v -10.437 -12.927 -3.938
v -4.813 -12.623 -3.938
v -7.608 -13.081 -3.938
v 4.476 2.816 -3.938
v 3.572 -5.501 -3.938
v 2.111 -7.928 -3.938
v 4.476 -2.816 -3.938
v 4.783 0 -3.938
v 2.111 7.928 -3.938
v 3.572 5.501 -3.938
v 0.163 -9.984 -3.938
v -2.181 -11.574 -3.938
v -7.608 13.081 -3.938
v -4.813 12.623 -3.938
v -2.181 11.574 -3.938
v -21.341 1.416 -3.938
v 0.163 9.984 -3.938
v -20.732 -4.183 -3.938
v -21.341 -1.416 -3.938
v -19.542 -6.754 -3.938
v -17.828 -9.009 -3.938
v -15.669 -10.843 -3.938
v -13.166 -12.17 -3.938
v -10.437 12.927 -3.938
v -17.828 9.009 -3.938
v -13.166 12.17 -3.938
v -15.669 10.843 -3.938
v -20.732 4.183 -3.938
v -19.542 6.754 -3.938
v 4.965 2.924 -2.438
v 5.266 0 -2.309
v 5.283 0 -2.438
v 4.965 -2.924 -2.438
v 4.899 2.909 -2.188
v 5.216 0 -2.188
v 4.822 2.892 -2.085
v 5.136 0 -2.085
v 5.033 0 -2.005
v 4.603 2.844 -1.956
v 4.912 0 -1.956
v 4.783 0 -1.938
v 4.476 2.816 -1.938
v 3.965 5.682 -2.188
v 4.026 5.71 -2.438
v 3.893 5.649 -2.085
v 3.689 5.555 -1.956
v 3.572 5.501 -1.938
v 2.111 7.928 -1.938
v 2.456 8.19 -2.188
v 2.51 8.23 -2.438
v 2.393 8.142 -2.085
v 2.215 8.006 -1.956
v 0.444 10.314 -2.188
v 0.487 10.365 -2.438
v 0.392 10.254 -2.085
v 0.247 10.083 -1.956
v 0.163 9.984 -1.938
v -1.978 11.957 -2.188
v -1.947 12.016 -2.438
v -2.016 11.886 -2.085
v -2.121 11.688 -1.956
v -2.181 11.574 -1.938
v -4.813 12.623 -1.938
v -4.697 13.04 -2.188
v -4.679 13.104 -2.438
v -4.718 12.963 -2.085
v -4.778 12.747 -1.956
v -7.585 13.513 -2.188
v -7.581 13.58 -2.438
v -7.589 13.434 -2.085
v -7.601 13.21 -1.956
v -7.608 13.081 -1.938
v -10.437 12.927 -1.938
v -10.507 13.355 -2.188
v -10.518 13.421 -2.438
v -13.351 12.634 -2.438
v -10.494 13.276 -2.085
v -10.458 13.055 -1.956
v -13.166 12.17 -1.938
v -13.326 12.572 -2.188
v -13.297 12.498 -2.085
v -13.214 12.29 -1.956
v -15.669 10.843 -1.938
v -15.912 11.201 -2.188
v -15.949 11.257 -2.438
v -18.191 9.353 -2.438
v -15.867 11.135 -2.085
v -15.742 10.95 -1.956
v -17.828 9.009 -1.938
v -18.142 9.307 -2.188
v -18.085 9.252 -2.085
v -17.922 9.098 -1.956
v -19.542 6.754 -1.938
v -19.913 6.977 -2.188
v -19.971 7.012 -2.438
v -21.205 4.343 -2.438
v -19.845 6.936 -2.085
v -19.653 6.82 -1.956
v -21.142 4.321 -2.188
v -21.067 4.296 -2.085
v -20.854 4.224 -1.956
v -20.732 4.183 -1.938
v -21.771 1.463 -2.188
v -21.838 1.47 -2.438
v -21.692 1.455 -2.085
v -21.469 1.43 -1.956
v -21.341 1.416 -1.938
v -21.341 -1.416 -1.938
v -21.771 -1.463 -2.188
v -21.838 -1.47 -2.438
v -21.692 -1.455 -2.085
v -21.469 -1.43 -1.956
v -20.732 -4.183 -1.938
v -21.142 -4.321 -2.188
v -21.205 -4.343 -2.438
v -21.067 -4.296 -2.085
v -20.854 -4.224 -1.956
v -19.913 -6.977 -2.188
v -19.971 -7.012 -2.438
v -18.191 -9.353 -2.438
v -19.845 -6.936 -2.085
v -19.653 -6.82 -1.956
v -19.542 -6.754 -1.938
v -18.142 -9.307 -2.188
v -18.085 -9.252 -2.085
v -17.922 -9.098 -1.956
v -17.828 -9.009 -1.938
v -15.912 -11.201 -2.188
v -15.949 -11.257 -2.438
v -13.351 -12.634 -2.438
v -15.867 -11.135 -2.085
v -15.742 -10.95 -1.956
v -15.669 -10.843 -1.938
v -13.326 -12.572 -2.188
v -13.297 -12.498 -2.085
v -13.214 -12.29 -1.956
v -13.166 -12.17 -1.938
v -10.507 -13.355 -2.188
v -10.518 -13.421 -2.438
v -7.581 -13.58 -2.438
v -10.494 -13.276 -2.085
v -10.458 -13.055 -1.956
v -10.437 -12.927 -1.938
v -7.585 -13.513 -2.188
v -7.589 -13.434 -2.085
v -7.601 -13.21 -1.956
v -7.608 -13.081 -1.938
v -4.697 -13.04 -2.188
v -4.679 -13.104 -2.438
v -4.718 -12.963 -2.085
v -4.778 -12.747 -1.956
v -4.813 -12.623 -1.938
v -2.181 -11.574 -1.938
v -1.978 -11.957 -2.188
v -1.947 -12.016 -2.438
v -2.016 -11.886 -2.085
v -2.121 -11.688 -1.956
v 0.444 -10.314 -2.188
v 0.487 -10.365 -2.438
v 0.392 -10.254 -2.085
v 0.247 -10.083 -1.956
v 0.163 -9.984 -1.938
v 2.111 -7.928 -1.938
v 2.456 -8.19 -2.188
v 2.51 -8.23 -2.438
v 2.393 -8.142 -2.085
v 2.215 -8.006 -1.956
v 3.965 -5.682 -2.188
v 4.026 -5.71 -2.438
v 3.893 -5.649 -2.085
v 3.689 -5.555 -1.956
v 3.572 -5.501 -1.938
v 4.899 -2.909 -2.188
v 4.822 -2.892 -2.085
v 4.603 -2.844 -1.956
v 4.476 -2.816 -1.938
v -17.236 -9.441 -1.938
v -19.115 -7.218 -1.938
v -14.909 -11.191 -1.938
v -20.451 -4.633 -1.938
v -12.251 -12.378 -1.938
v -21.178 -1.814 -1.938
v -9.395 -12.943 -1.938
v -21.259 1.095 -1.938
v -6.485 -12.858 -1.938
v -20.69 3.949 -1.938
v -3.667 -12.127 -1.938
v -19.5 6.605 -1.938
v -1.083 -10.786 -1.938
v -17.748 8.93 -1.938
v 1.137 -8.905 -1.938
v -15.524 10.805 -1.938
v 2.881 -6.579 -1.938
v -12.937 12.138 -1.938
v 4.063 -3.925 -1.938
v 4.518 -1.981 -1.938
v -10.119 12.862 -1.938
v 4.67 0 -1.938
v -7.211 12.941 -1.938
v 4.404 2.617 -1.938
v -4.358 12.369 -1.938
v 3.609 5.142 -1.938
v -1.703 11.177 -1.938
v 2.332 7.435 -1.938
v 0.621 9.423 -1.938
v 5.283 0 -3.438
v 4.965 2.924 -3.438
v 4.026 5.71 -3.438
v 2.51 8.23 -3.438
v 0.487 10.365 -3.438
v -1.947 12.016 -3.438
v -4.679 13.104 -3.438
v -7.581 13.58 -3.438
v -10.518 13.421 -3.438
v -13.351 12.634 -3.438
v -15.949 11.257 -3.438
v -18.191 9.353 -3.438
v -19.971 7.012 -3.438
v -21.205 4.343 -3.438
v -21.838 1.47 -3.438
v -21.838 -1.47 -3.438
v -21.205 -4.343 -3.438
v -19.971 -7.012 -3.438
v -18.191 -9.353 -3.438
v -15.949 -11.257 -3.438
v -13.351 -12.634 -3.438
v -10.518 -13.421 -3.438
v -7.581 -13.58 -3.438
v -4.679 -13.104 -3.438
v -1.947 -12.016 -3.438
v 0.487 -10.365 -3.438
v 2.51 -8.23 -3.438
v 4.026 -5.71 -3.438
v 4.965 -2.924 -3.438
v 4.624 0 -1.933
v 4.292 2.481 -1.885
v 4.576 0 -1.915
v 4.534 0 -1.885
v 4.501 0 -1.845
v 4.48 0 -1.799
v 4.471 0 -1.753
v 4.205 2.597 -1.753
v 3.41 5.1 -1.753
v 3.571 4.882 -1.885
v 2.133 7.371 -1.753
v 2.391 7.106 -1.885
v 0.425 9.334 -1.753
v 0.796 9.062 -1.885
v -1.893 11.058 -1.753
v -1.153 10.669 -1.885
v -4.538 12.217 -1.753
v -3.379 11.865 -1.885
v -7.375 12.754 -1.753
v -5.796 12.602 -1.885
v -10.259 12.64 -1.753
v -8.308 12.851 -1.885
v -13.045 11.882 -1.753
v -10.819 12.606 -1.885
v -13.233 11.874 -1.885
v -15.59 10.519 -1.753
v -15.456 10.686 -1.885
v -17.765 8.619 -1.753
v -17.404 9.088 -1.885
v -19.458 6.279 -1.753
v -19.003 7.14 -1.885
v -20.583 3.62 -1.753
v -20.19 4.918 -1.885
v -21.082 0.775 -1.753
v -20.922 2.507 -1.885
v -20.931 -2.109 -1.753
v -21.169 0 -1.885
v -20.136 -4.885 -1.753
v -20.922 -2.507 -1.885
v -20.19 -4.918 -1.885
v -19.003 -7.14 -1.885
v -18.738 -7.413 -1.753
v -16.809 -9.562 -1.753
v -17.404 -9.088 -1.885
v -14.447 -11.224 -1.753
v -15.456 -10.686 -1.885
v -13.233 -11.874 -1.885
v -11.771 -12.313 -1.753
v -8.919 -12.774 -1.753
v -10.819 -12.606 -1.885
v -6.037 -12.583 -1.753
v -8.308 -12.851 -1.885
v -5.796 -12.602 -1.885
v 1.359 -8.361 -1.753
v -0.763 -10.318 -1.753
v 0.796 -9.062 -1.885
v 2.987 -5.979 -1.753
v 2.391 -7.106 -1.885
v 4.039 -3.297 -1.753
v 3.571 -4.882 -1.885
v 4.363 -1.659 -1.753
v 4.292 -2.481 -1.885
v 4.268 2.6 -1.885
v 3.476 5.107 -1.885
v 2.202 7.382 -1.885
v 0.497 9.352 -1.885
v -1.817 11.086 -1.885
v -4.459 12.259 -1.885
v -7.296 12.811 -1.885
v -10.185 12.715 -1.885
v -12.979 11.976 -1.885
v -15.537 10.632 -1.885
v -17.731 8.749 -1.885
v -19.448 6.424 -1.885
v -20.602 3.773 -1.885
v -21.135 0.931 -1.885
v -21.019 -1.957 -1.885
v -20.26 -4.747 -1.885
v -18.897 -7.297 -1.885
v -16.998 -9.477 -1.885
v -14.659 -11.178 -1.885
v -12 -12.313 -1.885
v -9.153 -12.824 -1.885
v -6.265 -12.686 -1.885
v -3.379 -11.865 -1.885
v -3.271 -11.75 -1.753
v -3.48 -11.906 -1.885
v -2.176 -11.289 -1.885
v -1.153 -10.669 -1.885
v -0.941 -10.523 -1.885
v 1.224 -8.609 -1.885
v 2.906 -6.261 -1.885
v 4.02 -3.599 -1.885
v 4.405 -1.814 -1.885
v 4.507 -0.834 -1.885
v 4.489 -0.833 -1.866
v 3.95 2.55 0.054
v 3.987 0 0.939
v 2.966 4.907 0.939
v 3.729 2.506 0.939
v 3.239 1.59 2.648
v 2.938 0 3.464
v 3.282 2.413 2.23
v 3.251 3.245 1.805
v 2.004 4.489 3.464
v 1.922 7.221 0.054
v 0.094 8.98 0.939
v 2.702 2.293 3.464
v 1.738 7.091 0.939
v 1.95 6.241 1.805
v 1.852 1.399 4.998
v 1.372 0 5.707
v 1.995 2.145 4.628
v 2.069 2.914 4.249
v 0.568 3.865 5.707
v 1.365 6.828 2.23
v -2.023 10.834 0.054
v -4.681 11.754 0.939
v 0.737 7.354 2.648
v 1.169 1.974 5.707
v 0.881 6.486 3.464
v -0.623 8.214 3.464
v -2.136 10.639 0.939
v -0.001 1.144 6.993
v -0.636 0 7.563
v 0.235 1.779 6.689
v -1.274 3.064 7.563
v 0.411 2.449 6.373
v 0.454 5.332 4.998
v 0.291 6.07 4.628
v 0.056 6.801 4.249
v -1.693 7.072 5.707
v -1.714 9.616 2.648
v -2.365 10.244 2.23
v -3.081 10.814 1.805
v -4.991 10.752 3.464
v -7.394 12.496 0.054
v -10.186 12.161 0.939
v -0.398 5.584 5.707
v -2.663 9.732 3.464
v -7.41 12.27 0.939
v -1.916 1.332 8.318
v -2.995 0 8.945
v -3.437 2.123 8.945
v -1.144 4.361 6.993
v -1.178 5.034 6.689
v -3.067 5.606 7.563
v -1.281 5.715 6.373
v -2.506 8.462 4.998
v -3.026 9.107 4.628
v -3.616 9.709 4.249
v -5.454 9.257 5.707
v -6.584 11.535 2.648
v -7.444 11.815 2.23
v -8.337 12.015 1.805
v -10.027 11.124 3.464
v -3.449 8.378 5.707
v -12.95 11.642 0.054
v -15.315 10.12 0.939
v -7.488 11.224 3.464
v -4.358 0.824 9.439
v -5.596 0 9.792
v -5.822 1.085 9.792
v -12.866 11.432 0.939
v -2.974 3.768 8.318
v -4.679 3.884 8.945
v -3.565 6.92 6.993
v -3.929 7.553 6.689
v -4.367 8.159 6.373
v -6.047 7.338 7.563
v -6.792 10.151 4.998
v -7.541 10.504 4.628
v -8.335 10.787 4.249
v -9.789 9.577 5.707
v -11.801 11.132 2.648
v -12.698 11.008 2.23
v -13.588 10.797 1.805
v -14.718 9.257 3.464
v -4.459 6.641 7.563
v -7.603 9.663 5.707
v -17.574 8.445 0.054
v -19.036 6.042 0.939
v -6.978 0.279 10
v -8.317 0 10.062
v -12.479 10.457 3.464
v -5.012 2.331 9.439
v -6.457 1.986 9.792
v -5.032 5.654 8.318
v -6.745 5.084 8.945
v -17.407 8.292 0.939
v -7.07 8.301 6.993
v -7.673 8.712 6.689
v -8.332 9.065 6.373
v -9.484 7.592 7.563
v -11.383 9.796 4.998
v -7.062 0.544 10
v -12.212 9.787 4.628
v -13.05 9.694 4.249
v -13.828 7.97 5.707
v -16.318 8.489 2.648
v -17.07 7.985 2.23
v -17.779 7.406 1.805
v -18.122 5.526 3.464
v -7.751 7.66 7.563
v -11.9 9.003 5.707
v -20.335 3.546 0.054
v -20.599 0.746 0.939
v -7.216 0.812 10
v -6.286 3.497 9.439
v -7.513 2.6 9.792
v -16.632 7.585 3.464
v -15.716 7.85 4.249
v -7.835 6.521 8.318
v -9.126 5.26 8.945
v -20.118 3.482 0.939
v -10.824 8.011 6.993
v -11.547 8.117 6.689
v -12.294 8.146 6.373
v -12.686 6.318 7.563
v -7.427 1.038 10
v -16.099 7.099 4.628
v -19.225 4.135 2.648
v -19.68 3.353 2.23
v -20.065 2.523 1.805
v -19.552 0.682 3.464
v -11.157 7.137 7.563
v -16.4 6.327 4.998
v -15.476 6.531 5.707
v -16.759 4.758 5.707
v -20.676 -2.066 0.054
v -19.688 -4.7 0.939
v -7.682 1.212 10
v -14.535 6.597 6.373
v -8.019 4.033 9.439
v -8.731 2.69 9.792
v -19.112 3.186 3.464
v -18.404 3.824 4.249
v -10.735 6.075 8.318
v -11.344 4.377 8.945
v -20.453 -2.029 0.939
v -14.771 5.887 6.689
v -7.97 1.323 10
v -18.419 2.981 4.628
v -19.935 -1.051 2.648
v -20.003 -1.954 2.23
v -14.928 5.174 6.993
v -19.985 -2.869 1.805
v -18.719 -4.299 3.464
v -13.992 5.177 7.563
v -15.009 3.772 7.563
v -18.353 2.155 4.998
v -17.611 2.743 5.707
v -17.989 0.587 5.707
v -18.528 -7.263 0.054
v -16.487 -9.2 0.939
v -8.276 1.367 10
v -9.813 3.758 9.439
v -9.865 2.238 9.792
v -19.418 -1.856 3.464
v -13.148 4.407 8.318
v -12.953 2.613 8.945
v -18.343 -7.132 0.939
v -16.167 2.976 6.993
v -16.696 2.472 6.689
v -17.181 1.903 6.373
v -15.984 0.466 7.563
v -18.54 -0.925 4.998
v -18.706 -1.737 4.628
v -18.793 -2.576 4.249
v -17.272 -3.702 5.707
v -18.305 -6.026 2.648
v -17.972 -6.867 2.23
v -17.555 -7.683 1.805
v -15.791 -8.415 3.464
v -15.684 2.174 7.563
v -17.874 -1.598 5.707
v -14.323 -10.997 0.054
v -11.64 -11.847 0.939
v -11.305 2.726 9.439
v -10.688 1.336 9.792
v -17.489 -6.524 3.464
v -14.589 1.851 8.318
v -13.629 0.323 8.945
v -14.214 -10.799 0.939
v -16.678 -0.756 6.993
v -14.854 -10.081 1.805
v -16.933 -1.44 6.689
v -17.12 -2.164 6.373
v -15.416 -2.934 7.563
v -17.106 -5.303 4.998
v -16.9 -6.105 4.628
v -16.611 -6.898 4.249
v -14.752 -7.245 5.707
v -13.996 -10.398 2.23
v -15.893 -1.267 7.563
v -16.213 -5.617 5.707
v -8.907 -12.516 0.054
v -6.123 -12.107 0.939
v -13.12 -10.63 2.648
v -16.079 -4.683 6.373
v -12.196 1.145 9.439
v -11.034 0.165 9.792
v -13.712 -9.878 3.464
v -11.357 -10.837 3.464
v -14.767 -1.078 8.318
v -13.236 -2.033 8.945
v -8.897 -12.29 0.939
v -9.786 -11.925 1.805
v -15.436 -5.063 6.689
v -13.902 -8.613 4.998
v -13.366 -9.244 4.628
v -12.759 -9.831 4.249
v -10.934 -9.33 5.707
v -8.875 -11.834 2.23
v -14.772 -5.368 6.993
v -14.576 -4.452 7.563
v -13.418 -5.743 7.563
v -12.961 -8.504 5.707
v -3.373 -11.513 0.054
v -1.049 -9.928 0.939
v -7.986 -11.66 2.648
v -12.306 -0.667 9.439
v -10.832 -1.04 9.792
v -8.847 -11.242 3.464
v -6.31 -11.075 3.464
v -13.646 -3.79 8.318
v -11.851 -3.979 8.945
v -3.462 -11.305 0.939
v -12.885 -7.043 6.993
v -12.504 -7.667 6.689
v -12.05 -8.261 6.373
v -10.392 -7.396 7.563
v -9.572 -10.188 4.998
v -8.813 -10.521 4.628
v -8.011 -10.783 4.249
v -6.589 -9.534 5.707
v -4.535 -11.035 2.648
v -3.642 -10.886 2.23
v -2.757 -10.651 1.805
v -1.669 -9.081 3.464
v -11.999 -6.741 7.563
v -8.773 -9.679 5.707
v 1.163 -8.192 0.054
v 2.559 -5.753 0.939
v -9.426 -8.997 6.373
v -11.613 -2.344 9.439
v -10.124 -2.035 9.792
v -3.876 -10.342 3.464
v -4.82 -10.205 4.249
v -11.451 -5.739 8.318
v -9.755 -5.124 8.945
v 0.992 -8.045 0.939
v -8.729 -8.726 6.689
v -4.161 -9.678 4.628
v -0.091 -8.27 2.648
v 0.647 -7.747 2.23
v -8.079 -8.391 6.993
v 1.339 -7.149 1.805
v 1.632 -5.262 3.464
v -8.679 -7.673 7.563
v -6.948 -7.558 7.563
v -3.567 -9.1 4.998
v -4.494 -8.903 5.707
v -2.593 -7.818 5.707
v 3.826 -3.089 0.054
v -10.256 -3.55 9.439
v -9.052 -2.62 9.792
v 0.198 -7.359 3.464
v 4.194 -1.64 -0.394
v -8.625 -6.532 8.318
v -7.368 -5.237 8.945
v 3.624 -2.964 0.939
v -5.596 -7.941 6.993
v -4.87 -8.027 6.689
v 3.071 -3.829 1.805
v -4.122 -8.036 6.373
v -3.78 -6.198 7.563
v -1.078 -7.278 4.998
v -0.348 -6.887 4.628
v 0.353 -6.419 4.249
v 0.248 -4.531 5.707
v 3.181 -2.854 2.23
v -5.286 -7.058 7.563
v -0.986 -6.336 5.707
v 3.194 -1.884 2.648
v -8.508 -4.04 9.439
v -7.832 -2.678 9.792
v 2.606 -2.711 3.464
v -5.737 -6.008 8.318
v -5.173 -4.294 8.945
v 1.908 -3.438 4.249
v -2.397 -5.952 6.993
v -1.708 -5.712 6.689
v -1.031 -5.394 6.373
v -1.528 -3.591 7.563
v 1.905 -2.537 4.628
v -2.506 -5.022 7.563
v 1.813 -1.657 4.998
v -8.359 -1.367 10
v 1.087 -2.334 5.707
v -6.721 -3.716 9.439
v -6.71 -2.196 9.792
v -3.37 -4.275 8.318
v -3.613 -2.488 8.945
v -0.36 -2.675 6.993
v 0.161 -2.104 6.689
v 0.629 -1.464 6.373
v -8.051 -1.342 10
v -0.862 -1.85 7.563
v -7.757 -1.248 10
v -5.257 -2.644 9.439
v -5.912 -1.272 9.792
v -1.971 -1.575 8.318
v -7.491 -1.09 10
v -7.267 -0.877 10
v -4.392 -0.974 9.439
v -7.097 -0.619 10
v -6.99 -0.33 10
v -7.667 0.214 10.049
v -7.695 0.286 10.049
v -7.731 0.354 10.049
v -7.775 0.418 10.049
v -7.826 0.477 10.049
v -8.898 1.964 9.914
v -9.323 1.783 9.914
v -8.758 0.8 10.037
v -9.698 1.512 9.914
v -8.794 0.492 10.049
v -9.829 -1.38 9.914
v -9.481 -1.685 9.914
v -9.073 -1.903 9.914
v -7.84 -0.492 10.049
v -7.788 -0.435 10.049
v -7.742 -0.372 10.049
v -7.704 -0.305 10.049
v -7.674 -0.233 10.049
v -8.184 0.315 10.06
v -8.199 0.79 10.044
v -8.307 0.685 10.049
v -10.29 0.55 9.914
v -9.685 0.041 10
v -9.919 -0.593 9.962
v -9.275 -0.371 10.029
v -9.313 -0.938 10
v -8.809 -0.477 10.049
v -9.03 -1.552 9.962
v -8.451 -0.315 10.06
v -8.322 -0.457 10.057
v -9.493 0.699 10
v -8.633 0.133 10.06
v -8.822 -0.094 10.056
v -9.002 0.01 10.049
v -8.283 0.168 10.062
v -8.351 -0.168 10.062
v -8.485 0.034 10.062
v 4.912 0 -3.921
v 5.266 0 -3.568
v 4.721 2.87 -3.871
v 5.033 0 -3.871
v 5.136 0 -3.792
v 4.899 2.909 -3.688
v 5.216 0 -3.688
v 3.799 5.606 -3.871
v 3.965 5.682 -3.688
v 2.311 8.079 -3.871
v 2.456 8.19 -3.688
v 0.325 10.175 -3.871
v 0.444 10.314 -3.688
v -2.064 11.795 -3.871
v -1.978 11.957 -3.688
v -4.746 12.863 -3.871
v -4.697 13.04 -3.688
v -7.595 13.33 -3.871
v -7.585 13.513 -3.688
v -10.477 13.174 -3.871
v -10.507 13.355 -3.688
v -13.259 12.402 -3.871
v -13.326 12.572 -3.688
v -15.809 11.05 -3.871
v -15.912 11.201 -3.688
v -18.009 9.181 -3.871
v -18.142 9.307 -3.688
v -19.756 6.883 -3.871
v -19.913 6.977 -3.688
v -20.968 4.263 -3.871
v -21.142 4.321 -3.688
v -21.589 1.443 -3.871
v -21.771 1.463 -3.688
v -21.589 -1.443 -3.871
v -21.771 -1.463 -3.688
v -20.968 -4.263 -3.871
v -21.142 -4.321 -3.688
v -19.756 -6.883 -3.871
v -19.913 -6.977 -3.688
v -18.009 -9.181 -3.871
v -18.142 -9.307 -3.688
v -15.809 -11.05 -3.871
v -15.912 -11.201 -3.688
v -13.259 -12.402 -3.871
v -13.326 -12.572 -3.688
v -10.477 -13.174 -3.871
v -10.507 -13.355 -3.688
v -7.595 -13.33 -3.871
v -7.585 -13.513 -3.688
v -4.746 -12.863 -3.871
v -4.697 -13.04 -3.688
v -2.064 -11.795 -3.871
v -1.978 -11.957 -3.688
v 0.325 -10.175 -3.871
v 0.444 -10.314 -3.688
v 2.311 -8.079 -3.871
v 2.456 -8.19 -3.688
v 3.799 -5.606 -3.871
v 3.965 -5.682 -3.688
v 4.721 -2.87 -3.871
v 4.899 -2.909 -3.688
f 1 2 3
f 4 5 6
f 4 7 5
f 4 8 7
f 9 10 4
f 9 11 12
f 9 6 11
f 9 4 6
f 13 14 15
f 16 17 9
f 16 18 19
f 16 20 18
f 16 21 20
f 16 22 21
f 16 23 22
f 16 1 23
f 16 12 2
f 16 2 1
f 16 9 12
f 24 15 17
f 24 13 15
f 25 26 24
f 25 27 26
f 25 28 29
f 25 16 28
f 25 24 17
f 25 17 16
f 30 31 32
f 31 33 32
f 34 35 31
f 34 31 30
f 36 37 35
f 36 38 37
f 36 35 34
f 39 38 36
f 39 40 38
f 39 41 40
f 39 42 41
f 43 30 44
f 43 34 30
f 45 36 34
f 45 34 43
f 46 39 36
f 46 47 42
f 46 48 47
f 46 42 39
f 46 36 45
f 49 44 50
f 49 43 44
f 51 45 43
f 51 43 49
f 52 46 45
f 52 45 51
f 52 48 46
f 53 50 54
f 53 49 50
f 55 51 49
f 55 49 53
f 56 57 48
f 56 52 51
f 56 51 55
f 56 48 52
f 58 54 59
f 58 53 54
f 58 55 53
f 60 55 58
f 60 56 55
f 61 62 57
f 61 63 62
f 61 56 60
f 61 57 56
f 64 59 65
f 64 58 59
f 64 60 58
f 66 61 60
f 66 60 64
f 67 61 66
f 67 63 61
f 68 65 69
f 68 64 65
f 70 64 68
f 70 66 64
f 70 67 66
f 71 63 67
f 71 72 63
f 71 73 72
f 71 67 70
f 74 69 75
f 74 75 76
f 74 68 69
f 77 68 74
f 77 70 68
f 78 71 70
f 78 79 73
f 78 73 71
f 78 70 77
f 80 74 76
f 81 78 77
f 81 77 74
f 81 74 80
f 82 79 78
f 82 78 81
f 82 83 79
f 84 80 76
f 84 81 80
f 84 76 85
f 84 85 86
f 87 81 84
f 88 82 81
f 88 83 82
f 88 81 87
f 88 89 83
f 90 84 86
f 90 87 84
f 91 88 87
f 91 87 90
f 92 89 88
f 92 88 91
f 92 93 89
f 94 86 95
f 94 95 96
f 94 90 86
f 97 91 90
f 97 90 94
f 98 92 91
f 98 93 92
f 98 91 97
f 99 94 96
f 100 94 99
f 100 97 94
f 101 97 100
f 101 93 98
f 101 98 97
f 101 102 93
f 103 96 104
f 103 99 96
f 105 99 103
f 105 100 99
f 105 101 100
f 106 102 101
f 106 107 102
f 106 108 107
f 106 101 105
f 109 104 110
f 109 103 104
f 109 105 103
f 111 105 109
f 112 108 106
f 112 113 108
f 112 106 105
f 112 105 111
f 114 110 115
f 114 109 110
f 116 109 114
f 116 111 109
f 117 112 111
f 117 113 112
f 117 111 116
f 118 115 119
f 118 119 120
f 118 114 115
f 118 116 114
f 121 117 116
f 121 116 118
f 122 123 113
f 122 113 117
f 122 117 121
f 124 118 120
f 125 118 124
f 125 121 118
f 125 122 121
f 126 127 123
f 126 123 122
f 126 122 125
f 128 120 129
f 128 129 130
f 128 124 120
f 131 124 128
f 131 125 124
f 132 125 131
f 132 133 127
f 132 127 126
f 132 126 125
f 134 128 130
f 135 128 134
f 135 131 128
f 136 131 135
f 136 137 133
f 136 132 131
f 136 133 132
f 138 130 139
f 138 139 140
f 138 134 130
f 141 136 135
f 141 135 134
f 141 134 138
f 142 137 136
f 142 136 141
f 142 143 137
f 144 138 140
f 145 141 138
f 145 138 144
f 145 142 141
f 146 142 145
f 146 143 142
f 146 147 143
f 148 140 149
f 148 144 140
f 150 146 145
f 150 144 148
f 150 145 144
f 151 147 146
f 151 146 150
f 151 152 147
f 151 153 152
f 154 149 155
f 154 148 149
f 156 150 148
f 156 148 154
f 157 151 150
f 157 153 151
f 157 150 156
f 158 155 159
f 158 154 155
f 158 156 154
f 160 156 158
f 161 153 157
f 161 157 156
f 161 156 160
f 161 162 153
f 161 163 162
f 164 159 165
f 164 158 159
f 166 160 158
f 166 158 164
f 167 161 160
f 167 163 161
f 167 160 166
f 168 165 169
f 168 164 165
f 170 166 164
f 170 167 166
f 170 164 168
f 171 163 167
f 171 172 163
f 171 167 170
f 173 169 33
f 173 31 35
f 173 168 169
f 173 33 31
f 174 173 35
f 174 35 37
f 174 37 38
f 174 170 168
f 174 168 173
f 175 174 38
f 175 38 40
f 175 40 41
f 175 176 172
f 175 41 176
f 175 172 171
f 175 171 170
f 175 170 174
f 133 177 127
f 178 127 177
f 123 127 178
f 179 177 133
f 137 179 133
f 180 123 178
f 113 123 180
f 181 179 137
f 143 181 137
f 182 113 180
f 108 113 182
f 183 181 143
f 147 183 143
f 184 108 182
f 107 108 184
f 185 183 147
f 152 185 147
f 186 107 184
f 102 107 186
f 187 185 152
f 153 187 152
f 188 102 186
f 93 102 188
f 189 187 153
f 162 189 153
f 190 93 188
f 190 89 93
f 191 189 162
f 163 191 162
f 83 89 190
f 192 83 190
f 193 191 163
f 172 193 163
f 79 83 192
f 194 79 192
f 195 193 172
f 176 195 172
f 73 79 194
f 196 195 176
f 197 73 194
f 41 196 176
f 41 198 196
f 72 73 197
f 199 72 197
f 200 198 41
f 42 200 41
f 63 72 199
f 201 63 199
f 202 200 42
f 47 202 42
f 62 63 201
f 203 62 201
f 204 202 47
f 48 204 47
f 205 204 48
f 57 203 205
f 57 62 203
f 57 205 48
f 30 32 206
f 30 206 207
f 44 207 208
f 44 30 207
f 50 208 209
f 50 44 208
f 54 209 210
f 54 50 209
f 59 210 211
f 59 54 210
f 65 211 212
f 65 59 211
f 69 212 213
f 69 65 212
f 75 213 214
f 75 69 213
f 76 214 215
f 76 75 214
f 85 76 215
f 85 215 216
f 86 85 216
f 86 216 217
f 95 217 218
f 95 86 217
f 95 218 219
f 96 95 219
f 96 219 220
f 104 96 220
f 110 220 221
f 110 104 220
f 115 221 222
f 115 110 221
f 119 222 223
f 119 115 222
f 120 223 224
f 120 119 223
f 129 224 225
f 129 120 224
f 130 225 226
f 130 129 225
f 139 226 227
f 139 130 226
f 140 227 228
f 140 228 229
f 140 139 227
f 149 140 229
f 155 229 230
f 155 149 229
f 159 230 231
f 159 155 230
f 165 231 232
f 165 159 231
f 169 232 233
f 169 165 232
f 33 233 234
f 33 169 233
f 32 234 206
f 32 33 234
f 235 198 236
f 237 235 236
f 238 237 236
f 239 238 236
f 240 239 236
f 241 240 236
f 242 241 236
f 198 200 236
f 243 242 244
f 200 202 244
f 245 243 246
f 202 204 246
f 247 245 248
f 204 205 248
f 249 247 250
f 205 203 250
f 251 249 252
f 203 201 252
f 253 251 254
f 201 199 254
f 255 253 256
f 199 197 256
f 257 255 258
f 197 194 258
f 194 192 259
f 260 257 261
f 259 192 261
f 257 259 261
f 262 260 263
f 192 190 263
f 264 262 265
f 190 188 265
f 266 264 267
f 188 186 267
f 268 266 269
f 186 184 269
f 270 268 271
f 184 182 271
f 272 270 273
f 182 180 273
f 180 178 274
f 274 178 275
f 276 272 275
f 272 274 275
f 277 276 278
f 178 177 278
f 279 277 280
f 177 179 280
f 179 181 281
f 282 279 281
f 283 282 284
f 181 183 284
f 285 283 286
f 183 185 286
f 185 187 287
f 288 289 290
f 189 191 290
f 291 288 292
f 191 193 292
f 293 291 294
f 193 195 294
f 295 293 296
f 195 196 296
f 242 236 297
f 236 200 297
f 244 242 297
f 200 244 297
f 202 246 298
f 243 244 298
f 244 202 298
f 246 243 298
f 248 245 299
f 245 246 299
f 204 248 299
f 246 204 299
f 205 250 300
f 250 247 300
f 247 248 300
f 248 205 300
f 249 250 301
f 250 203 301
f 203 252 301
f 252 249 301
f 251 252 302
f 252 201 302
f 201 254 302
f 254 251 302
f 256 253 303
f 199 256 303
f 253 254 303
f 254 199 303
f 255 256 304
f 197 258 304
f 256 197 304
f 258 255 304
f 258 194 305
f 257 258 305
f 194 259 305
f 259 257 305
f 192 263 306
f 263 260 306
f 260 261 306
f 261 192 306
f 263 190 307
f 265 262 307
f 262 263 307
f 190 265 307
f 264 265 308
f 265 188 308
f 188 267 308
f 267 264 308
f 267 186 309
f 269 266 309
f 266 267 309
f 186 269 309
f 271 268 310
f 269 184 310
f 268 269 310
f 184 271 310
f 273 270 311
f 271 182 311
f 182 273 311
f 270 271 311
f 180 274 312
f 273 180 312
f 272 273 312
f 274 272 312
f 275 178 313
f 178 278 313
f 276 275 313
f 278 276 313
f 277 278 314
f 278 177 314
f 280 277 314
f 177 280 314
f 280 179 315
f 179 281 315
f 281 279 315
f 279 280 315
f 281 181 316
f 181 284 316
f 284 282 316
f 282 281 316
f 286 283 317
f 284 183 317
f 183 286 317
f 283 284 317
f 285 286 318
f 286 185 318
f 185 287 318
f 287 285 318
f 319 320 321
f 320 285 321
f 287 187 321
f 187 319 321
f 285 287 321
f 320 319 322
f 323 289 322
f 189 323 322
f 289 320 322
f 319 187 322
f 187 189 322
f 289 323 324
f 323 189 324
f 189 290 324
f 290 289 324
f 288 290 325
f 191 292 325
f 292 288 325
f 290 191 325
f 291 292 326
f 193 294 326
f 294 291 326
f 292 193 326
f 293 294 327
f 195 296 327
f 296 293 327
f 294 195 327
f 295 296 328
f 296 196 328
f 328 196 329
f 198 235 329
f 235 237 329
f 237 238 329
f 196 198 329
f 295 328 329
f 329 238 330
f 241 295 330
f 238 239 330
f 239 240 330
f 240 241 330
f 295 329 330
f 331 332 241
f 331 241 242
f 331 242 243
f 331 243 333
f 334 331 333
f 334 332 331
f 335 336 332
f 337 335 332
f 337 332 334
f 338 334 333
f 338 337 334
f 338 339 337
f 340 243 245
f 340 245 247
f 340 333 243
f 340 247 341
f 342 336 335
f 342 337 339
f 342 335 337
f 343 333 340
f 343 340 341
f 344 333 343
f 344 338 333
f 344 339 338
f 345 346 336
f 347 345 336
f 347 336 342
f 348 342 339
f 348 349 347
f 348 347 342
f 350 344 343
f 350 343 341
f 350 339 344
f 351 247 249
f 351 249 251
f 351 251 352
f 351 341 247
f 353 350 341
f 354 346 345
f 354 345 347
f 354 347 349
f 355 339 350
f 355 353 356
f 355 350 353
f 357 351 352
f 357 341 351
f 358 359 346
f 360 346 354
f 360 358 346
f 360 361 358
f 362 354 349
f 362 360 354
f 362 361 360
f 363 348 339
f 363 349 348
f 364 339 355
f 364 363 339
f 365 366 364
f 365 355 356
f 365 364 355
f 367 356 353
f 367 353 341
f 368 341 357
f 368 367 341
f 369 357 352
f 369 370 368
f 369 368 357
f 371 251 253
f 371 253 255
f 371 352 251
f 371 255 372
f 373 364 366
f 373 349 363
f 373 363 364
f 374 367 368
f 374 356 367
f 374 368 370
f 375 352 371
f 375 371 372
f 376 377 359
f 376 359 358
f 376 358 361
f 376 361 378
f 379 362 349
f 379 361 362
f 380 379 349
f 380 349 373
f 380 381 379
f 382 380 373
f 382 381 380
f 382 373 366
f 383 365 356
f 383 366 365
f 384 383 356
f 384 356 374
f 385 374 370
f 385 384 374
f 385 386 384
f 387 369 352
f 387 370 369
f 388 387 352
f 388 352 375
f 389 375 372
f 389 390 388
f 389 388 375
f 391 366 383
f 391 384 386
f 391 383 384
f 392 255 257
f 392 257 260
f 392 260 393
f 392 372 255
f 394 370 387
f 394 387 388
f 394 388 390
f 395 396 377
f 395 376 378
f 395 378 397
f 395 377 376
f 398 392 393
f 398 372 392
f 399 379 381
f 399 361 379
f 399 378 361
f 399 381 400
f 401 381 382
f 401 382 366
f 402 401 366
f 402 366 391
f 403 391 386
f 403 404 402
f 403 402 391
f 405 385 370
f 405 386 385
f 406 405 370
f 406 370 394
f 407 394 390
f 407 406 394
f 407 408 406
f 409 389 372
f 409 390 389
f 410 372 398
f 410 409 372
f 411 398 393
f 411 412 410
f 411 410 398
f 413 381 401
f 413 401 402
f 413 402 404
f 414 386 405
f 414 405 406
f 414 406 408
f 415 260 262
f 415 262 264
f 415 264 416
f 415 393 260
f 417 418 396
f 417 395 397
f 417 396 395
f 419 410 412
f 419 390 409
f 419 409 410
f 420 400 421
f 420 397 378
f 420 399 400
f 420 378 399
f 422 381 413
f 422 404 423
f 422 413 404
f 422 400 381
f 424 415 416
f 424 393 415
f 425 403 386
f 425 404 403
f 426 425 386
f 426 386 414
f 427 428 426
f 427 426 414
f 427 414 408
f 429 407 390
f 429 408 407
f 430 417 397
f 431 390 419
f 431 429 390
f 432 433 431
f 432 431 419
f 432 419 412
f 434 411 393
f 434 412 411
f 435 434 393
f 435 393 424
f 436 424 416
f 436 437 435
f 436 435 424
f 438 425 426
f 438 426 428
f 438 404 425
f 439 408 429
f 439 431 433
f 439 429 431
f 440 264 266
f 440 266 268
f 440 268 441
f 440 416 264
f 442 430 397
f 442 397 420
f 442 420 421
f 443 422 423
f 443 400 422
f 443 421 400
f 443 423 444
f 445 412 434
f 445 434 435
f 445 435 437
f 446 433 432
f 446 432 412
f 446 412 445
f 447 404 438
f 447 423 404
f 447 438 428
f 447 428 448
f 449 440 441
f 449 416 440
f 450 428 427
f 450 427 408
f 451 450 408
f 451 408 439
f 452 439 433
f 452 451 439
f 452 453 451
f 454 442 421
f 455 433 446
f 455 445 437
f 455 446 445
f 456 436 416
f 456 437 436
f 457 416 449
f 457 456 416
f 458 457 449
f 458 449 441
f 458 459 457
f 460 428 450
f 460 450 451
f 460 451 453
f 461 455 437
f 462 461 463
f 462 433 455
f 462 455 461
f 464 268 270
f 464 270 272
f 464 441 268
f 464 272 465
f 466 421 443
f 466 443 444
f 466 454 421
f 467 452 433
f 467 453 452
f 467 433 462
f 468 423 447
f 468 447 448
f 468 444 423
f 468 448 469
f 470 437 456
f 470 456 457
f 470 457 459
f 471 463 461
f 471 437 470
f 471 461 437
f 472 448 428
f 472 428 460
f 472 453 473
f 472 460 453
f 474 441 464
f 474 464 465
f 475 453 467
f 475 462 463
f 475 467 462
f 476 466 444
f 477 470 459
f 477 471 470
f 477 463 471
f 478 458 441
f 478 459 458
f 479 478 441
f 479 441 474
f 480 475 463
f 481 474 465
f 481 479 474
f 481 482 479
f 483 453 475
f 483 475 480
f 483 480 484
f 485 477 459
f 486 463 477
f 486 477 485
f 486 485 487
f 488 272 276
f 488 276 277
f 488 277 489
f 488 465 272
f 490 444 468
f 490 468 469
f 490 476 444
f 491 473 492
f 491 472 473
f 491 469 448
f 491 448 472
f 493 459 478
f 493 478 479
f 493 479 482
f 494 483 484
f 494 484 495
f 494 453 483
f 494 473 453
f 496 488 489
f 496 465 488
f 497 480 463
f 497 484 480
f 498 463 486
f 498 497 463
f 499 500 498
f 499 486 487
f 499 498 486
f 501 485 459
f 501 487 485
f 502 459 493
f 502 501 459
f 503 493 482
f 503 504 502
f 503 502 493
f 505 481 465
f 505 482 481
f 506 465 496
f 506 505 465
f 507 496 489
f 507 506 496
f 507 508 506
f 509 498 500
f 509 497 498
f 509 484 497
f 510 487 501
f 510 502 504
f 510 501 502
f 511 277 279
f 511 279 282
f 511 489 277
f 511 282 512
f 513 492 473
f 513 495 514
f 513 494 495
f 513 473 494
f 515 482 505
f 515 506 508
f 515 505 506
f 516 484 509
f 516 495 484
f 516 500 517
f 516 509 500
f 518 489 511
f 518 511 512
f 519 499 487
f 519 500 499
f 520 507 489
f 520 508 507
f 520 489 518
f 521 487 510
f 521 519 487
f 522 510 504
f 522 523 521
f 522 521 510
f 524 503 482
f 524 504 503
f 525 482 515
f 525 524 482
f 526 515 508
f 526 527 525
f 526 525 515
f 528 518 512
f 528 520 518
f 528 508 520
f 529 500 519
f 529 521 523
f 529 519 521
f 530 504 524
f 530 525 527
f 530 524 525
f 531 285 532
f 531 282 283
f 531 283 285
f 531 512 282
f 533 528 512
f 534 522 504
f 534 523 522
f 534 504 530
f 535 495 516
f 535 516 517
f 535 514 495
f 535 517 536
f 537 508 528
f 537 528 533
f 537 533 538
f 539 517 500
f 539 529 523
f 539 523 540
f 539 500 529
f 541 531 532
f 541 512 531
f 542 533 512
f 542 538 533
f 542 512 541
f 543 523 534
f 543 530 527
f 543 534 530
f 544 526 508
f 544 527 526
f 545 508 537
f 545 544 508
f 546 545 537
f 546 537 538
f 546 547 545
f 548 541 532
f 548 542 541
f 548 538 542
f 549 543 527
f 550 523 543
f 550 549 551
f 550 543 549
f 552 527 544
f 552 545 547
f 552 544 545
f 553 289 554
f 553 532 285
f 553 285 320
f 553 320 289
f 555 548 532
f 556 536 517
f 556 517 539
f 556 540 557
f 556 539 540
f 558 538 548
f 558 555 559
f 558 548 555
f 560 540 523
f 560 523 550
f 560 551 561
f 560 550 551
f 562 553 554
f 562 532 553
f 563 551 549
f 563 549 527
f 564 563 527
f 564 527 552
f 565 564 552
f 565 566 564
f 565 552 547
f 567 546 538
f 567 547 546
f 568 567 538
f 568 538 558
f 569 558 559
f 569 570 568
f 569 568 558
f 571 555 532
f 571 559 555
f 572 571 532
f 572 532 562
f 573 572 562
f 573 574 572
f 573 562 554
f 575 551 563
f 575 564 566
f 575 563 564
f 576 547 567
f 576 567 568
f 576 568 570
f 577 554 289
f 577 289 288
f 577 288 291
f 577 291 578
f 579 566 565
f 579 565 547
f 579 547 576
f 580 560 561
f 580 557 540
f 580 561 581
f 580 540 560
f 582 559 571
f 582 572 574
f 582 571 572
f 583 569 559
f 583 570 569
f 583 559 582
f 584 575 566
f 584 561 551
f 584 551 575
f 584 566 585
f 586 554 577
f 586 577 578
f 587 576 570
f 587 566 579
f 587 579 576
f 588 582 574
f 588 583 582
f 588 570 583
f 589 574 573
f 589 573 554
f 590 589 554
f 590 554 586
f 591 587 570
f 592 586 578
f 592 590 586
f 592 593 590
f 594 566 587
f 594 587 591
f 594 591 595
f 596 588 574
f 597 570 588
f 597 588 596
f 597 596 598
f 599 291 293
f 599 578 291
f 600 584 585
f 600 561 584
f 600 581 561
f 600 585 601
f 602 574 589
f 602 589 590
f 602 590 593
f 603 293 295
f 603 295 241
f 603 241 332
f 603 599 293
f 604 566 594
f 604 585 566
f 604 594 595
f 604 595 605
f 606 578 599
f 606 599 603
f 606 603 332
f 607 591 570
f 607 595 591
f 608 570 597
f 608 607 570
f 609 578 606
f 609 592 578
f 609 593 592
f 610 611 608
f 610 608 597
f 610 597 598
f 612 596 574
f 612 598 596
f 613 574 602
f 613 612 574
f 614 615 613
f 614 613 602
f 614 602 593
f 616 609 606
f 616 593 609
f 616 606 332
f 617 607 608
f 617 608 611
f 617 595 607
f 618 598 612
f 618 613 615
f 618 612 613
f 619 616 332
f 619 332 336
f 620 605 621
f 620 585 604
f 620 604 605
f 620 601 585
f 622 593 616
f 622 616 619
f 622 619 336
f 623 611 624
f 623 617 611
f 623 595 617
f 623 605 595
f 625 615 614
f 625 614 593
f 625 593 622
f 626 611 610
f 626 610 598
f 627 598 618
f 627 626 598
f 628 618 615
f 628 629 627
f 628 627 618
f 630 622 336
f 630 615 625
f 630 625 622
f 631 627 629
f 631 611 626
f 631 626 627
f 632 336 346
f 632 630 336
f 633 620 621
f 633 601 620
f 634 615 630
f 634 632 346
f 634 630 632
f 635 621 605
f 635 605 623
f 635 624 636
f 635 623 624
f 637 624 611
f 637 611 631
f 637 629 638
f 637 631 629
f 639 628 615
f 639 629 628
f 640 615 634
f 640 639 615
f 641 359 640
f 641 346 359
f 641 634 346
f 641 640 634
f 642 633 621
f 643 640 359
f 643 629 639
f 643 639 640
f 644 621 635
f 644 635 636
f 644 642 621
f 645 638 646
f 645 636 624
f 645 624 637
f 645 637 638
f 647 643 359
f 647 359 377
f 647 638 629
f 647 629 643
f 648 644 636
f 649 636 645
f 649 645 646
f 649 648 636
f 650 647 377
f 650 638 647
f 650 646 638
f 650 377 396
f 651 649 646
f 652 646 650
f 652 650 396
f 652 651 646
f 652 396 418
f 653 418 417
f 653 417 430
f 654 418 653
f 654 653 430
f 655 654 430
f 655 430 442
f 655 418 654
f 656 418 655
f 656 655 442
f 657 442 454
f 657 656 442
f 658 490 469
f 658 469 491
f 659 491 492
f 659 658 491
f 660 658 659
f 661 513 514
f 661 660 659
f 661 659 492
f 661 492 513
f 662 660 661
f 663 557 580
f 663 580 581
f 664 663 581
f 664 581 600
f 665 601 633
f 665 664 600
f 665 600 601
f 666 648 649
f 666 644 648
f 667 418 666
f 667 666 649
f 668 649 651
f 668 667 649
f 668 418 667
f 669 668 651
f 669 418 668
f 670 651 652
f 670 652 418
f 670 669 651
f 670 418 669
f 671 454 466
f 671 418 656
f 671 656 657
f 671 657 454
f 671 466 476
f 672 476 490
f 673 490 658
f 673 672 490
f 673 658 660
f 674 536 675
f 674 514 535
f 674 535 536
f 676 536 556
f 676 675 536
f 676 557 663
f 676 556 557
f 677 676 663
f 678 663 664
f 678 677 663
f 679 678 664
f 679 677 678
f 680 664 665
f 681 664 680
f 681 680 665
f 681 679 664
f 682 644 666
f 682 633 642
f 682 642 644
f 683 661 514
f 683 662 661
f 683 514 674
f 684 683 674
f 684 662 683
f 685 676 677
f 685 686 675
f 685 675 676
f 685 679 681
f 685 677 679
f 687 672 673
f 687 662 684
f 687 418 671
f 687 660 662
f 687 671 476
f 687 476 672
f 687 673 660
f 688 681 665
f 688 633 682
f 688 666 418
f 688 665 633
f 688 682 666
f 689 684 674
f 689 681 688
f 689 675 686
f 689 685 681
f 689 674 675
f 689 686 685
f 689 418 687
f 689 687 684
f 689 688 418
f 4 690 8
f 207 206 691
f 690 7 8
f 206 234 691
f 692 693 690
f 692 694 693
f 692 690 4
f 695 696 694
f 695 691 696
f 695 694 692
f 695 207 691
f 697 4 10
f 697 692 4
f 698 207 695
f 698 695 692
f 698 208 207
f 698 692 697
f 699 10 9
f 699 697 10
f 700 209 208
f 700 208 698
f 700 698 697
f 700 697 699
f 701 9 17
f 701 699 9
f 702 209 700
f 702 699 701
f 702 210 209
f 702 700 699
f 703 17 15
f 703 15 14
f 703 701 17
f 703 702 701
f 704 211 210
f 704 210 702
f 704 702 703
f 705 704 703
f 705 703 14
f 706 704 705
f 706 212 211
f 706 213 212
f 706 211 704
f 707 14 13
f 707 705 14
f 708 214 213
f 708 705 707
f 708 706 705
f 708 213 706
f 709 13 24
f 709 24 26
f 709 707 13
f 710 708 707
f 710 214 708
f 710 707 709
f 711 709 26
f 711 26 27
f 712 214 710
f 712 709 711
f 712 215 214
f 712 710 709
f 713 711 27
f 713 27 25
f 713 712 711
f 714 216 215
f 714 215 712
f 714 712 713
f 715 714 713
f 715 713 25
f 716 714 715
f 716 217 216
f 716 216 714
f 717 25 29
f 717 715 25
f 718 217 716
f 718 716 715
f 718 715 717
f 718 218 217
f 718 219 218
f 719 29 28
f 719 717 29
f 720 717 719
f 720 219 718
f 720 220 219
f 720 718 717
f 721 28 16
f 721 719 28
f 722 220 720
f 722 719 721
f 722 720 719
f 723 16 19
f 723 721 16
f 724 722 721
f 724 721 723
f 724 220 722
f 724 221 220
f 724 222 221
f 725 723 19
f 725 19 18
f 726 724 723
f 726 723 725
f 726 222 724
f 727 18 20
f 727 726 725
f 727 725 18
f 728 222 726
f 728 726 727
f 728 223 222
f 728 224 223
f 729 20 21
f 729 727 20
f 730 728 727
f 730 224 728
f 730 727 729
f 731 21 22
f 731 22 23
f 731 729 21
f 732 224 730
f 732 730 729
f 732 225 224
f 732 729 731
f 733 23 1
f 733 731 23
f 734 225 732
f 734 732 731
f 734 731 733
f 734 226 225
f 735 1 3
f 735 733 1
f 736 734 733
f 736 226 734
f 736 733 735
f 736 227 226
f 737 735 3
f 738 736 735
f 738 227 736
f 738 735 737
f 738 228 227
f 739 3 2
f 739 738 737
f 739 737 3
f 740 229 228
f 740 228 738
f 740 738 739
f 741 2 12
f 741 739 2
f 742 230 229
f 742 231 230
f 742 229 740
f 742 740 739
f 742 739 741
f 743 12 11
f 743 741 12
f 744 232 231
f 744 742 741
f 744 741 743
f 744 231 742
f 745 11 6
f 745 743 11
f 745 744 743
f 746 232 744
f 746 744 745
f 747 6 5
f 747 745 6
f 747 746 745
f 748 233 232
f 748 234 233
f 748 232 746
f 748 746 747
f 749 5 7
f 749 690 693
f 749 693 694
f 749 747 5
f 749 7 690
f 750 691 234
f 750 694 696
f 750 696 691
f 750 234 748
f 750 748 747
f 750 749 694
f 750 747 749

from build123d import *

# Parameters (mm, degrees)
F2_R = 0.5
F3_R = 0.2


with BuildPart() as f1:
    # F0 (on Front) → F1 (revolve)
    with BuildSketch(Plane.XZ):
        with BuildLine():
            Line((-8.3173271554, 10.0615177009), (-8.3173271554, -3.9384822991))
            Line((-8.3173271554, -3.9384822991), (5.2826728446, -3.9384822991))
            Line((5.2826728446, -3.9384822991), (5.2826728446, -1.9384822991))
            Line((5.2826728446, -1.9384822991), (4.4826728446, -1.9384822991))
            ThreePointArc((4.4826728446, -1.9384822991), (0.4863851378, 6.6254774803), (-8.3173271554, 10.0615177009))
        make_face()
    revolve(axis=Axis((-8.3173271554, 0, 3.0615177009), (0, 0, 1)))

    # F2
    f2_edges = [f1.edges().sort_by_distance(p)[0] for p in [
        (-21.917327, 0, -3.938482),
        (-21.917327, 0, -1.938482),
    ]]
    fillet(f2_edges, radius=F2_R)

    # F3
    f3_edges = [f1.edges().sort_by_distance(p)[0] for p in [
        (-21.117327, 0, -1.938482),
    ]]
    fillet(f3_edges, radius=F3_R)


solid = f1.part
